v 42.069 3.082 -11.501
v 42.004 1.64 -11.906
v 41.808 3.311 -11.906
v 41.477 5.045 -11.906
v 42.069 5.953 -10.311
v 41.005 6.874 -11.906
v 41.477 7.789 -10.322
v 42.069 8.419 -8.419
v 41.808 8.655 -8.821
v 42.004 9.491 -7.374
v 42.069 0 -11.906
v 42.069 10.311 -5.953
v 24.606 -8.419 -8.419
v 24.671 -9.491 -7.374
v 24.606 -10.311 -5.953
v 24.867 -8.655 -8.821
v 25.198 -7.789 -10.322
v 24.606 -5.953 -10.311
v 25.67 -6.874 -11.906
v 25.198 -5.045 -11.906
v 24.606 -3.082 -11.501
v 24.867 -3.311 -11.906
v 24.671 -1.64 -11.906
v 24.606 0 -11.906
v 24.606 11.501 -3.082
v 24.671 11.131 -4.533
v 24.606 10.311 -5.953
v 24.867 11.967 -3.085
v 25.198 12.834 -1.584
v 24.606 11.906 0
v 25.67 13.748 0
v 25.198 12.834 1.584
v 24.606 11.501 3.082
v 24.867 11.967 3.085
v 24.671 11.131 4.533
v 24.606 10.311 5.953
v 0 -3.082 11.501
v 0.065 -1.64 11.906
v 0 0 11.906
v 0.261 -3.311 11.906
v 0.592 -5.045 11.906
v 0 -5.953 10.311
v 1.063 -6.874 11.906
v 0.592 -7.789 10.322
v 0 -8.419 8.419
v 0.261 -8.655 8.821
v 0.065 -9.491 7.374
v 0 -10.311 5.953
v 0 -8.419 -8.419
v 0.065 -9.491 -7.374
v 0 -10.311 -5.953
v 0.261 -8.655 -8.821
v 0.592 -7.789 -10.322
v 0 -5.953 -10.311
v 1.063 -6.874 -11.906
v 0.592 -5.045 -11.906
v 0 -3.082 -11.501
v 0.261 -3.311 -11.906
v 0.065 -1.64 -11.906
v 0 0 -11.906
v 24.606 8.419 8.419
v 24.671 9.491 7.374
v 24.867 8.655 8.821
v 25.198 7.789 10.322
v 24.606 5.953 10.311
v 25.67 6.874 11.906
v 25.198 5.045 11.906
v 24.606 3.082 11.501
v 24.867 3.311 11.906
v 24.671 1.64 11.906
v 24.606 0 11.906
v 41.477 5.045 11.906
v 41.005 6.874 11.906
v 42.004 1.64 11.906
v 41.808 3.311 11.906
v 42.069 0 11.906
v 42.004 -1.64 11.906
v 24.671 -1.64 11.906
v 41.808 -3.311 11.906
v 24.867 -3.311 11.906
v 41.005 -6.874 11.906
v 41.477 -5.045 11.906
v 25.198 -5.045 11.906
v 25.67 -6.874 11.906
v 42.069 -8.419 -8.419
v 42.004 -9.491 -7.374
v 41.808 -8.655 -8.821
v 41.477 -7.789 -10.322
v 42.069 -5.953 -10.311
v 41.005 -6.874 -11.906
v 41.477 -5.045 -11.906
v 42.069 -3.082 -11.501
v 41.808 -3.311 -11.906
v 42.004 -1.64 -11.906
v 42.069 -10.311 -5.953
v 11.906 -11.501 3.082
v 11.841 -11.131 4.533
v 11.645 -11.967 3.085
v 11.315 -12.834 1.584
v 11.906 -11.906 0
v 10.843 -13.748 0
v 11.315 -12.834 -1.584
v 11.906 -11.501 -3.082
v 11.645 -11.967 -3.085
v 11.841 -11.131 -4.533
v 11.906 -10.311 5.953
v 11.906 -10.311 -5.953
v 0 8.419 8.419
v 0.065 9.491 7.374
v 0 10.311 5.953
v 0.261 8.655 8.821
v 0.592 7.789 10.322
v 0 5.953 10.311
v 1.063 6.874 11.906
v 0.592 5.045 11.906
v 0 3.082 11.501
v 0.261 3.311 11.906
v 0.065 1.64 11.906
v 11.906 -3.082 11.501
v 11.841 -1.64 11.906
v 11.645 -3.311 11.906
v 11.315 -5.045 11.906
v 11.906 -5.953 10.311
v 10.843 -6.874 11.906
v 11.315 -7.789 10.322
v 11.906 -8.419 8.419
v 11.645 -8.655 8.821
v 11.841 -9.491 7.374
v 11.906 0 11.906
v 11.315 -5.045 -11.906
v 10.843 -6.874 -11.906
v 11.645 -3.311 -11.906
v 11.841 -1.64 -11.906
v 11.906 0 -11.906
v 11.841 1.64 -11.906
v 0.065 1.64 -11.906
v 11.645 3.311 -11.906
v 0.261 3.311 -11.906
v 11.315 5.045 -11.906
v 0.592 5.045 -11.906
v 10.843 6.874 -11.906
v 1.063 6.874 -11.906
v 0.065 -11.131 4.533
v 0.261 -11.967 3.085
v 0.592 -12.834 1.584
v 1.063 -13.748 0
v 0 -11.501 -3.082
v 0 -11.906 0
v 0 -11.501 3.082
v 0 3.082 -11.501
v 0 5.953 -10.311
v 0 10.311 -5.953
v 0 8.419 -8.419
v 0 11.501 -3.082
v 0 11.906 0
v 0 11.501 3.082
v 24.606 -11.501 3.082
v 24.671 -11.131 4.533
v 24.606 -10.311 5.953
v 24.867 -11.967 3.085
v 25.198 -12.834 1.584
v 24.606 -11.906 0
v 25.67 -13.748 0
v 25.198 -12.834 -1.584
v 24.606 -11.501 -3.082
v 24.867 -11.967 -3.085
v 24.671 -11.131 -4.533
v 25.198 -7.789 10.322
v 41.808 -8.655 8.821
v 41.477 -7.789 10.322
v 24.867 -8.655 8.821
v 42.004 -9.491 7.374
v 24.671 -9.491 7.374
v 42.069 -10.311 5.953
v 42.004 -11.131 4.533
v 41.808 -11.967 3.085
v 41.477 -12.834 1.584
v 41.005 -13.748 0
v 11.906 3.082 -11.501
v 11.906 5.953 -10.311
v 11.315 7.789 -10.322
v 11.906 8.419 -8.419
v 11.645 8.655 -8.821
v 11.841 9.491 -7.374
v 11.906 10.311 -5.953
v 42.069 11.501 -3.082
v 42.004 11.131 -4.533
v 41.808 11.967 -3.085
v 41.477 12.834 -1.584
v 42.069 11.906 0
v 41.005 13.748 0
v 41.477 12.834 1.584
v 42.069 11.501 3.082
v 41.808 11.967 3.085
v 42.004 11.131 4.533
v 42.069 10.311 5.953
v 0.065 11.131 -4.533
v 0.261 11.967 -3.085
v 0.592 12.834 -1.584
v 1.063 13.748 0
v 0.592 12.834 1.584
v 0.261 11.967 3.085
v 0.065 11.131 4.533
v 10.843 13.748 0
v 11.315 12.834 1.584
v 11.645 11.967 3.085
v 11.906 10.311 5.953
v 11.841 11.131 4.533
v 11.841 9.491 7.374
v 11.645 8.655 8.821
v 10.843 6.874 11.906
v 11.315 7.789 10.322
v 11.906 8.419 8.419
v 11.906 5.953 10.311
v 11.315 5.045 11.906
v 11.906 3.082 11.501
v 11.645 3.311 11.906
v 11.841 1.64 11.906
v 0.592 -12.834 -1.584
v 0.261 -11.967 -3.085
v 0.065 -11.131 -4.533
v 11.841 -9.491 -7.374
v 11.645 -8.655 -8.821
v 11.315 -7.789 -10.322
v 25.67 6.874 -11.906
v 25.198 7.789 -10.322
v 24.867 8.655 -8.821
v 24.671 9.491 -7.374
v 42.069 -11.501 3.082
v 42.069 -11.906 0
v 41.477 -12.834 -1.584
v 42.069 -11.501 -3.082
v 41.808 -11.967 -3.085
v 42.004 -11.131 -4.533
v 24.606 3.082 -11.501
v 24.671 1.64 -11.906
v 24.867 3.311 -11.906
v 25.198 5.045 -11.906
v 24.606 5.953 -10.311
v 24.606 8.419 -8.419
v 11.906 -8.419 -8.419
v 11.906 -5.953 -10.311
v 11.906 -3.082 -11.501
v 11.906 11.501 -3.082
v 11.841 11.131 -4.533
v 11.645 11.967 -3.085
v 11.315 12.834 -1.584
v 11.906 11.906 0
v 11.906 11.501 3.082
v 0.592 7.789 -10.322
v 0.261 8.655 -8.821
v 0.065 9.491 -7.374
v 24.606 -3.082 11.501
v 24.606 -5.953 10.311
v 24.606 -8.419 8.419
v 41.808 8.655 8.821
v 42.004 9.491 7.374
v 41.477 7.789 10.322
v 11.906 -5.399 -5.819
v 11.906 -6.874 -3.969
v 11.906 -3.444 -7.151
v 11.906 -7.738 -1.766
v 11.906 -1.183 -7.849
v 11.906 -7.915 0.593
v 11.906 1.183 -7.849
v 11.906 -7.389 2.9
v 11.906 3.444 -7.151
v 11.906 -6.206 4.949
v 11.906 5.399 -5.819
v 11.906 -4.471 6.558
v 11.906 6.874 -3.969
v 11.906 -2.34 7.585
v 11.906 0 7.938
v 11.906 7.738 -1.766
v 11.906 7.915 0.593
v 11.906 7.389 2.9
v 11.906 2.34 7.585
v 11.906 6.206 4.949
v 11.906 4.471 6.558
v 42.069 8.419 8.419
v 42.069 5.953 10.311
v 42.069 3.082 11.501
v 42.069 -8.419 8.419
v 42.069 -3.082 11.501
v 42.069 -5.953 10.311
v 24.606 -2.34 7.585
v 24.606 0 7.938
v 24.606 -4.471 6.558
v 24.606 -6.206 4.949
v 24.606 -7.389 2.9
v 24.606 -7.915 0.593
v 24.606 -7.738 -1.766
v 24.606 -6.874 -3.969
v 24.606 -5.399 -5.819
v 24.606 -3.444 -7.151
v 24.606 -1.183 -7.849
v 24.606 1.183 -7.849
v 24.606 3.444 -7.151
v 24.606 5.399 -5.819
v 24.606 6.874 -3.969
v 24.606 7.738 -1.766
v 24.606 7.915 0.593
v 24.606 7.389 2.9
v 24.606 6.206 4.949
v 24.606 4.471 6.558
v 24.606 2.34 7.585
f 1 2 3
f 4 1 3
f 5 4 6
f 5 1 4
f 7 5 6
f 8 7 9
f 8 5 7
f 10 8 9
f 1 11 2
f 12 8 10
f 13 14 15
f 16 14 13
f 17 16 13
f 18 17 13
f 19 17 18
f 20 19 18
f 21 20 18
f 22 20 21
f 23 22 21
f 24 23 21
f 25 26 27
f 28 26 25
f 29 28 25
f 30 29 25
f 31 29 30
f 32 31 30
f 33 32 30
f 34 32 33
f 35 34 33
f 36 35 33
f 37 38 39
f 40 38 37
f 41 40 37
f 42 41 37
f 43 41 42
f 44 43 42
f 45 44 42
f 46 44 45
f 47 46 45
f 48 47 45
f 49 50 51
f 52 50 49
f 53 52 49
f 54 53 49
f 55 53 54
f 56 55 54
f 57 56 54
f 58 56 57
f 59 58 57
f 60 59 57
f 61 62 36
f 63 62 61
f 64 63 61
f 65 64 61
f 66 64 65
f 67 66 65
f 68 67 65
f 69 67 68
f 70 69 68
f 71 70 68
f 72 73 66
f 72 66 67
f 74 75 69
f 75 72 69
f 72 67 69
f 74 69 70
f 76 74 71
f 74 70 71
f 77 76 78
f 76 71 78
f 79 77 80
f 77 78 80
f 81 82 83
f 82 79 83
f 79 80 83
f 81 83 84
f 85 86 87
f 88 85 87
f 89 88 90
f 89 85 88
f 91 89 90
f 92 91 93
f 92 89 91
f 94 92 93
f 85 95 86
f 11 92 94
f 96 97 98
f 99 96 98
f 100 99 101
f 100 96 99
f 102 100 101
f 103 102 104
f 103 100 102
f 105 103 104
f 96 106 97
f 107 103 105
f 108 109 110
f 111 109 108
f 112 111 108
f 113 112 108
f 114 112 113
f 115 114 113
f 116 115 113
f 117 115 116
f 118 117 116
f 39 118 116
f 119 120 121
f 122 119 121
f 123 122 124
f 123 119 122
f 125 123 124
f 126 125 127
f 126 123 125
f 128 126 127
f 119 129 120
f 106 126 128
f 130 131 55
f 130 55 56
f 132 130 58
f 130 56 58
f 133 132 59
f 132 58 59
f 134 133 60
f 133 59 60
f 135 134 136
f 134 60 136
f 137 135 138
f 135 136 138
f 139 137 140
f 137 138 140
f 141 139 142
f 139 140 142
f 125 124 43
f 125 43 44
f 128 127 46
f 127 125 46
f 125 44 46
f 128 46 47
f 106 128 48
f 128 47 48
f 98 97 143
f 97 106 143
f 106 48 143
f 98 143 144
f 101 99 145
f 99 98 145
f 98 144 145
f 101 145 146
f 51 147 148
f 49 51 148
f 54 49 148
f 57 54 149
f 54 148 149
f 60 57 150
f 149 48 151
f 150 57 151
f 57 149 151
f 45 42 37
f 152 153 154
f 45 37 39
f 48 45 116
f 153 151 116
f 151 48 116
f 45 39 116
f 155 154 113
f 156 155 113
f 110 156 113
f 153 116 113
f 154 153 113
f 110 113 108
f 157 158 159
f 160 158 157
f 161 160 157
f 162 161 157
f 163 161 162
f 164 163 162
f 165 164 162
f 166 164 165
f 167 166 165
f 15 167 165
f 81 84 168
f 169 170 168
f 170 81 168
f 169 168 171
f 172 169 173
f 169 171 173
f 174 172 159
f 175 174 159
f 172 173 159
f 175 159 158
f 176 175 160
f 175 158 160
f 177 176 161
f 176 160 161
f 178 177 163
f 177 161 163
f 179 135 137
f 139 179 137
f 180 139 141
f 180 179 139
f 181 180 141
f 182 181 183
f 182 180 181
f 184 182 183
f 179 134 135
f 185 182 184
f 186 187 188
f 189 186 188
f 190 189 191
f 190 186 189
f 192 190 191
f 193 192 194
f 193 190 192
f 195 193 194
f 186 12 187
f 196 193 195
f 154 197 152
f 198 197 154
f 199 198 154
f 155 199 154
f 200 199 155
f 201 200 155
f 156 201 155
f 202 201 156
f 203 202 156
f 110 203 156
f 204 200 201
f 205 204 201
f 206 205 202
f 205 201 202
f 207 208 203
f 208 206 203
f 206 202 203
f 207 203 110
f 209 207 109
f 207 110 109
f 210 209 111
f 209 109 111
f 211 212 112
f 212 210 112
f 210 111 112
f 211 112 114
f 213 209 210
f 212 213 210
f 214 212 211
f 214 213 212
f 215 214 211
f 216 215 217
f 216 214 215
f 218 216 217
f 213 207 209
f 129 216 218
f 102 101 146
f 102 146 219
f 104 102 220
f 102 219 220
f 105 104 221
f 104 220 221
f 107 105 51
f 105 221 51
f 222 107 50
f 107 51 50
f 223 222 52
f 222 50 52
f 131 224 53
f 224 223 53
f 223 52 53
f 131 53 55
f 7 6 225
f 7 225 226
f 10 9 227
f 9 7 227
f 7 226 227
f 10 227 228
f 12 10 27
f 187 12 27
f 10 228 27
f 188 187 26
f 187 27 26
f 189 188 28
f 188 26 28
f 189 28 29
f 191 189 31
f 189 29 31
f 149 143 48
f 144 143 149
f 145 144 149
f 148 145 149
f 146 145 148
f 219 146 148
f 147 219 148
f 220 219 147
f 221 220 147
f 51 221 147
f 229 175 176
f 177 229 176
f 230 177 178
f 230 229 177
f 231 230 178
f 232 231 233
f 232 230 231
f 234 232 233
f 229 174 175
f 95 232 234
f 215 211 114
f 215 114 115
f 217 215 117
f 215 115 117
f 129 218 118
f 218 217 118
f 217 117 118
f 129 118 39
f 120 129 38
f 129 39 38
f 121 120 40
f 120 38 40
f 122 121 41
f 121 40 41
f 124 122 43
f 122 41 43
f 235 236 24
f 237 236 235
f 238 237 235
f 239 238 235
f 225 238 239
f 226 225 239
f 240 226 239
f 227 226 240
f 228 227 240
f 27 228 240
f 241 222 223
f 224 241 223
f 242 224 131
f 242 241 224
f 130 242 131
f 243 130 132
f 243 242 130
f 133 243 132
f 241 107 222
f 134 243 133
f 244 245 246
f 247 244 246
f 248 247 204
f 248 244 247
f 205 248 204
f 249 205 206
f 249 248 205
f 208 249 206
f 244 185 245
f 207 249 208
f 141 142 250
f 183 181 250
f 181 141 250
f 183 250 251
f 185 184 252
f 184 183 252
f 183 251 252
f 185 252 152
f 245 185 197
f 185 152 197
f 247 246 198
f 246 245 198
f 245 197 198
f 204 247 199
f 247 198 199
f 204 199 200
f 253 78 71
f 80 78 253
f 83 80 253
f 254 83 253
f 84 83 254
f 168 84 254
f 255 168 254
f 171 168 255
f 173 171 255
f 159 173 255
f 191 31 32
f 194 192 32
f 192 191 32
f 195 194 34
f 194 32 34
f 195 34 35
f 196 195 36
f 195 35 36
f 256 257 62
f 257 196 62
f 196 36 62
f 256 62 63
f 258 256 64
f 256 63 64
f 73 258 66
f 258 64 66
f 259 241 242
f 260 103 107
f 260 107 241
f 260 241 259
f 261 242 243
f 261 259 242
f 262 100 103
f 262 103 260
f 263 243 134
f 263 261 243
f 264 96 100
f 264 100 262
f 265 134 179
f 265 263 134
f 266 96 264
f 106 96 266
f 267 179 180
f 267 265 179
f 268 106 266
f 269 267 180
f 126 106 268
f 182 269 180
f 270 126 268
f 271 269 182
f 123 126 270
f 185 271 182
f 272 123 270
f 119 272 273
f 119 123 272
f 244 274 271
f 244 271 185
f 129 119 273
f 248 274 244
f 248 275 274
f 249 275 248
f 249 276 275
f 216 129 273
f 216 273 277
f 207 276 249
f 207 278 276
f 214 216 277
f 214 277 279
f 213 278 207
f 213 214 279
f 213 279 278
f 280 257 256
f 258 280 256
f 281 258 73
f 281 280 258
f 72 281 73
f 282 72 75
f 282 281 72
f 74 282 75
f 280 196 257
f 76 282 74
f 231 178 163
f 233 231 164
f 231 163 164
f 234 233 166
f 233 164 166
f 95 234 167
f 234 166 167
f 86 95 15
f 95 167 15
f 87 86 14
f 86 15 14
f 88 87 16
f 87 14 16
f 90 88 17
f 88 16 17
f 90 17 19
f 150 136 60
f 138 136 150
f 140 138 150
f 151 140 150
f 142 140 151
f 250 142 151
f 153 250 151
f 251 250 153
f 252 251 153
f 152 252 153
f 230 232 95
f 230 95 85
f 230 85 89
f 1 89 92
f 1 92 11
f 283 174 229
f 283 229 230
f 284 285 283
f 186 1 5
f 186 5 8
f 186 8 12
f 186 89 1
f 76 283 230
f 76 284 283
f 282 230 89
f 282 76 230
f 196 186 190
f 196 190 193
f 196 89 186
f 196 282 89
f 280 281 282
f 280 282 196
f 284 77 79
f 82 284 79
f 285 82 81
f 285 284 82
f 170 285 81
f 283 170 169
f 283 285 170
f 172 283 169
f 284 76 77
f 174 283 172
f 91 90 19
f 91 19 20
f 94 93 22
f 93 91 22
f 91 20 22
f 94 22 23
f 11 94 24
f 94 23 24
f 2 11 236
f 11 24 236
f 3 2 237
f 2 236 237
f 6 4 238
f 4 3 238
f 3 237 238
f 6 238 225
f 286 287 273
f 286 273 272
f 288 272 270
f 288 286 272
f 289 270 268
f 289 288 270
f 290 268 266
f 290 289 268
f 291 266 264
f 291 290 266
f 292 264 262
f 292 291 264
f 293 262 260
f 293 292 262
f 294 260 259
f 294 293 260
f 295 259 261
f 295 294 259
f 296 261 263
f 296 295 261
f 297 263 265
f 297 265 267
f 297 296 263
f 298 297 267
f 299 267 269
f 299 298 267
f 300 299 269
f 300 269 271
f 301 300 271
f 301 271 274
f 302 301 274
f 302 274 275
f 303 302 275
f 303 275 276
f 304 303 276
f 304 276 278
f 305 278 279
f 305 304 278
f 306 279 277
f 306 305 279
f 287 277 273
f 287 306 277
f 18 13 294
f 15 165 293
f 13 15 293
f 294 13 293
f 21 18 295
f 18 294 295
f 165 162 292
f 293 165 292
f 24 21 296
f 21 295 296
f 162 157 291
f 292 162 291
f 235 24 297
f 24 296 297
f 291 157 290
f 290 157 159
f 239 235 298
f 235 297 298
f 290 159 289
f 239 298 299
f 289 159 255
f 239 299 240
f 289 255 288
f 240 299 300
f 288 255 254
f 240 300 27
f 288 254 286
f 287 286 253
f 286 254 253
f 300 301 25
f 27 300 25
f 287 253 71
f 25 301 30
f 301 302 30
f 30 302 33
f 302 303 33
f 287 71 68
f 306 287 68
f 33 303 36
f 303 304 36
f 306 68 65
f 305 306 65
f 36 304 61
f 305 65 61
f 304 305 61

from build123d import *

# Parameters (mm, degrees)
F0_W     = 25.4
F0_H     = 7.9375
F3_DEPTH = 11.90625
F6_DEPTH = 17.4625


with BuildPart() as f1:
    # F0 (on Front) → F1 (revolve)
    with BuildSketch(Plane.XZ):
        with Locations((12.7, 3.96875)):
            Rectangle(F0_W, F0_H)
    revolve(axis=Axis((12.7, 0, 0), (1, 0, 0)))

    # F2 (on Right) → F3 (join)
    with BuildSketch(Plane.YZ):
        Polygon((6.874077, 11.90625), (-6.874077, 11.90625), (-13.748153, 0), (-6.874077, -11.90625), (6.874077, -11.90625), (13.748153, 0), align=None)
    extrude(amount=F3_DEPTH)

    # F5 (on offset) → F6 (join)
    with BuildSketch(Plane.YZ.offset(24.60625)):
        Polygon((6.874077, -11.90625), (13.748153, 0), (6.874077, 11.90625), (-6.874077, 11.90625), (-13.748153, 0), (-6.874077, -11.90625), align=None)
    extrude(amount=F6_DEPTH)

    # F7 (on Front) → F8 (revolve, cut)
    with BuildSketch(Plane.XZ):
        Polygon((0, 18.750624), (0, 11.90625), (3.951601, 18.750624), align=None)
        Polygon((7.954649, 18.750624), (11.90625, 11.90625), (11.90625, 18.750624), align=None)
        Polygon((24.60625, 18.750624), (24.60625, 11.90625), (28.557851, 18.750624), align=None)
        Polygon((42.06875, 11.90625), (42.06875, 18.750624), (38.117149, 18.750624), align=None)
    revolve(axis=Axis((39.392542, 0, 0), (1, 0, 0)), mode=Mode.SUBTRACT)


solid = f1.part
